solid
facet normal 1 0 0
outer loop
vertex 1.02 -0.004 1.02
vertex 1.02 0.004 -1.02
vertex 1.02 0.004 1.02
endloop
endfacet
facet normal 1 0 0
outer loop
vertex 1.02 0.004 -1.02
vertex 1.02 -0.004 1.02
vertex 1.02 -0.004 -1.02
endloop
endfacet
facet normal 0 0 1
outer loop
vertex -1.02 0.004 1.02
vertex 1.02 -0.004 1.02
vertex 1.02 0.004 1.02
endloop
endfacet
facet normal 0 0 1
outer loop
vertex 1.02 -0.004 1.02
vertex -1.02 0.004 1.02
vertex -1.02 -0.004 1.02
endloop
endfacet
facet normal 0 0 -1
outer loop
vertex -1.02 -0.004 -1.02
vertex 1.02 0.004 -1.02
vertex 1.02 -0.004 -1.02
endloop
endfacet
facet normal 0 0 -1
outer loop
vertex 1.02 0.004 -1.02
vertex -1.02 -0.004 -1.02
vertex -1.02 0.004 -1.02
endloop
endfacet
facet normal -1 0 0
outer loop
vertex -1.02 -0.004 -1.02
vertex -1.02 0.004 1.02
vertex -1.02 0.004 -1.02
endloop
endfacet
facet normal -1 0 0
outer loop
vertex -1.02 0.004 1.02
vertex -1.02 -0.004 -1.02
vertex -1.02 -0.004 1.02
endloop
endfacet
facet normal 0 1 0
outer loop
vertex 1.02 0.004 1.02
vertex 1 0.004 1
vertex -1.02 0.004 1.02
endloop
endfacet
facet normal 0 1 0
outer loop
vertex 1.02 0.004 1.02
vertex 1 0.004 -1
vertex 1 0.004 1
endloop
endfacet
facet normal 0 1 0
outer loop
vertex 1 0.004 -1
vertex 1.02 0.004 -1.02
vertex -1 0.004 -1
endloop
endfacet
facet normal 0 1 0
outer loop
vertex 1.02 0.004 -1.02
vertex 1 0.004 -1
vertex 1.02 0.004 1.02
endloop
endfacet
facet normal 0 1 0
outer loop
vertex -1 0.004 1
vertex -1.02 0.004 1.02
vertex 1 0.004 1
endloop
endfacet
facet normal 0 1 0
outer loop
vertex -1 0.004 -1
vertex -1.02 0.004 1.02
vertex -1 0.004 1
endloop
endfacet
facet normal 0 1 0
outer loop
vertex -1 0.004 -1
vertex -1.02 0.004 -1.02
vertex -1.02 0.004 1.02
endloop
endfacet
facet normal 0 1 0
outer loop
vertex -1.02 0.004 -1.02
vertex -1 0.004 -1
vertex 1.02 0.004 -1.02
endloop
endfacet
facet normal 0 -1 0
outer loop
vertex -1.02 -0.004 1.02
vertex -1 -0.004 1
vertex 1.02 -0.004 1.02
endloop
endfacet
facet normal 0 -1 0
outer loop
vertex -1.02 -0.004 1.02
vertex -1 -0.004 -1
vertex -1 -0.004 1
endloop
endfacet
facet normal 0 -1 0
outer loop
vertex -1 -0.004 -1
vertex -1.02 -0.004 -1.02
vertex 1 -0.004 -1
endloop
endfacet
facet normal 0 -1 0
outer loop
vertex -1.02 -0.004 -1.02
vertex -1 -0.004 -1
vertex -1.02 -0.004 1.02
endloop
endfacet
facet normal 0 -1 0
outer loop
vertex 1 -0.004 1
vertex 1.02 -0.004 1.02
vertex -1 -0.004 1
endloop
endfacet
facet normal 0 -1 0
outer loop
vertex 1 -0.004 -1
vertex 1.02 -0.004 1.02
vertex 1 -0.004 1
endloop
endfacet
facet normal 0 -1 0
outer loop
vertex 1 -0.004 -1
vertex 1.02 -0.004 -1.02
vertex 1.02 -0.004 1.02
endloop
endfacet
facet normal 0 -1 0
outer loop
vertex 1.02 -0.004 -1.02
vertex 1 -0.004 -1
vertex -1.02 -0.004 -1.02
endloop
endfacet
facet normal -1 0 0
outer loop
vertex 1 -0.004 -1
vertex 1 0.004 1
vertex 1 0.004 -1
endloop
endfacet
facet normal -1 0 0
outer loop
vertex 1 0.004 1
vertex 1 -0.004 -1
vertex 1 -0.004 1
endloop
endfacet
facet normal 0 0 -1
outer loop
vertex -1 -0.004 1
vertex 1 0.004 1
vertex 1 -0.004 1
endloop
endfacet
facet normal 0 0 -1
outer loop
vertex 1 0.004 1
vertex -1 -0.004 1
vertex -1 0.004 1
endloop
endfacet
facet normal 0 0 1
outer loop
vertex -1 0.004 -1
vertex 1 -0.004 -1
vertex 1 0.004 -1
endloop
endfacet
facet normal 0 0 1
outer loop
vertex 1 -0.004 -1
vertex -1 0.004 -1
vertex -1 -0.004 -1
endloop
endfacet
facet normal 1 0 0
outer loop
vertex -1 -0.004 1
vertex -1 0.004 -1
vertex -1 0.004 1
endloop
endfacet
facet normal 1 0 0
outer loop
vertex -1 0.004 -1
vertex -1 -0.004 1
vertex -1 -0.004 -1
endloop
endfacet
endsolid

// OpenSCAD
// Metres; X horizontal, Z up, Y depth; origin at centre.
// Select exported part with -D part=0 (frame) or -D part=1 (image).
part = 0;
module frame() difference() {
  cube([2.04,0.008,2.04],center=true);
  cube([2,0.01,2],center=true);
}
module image_surface() cube([2,0.008,2],center=true);
if (part == 0) frame();
if (part == 1) image_surface();
